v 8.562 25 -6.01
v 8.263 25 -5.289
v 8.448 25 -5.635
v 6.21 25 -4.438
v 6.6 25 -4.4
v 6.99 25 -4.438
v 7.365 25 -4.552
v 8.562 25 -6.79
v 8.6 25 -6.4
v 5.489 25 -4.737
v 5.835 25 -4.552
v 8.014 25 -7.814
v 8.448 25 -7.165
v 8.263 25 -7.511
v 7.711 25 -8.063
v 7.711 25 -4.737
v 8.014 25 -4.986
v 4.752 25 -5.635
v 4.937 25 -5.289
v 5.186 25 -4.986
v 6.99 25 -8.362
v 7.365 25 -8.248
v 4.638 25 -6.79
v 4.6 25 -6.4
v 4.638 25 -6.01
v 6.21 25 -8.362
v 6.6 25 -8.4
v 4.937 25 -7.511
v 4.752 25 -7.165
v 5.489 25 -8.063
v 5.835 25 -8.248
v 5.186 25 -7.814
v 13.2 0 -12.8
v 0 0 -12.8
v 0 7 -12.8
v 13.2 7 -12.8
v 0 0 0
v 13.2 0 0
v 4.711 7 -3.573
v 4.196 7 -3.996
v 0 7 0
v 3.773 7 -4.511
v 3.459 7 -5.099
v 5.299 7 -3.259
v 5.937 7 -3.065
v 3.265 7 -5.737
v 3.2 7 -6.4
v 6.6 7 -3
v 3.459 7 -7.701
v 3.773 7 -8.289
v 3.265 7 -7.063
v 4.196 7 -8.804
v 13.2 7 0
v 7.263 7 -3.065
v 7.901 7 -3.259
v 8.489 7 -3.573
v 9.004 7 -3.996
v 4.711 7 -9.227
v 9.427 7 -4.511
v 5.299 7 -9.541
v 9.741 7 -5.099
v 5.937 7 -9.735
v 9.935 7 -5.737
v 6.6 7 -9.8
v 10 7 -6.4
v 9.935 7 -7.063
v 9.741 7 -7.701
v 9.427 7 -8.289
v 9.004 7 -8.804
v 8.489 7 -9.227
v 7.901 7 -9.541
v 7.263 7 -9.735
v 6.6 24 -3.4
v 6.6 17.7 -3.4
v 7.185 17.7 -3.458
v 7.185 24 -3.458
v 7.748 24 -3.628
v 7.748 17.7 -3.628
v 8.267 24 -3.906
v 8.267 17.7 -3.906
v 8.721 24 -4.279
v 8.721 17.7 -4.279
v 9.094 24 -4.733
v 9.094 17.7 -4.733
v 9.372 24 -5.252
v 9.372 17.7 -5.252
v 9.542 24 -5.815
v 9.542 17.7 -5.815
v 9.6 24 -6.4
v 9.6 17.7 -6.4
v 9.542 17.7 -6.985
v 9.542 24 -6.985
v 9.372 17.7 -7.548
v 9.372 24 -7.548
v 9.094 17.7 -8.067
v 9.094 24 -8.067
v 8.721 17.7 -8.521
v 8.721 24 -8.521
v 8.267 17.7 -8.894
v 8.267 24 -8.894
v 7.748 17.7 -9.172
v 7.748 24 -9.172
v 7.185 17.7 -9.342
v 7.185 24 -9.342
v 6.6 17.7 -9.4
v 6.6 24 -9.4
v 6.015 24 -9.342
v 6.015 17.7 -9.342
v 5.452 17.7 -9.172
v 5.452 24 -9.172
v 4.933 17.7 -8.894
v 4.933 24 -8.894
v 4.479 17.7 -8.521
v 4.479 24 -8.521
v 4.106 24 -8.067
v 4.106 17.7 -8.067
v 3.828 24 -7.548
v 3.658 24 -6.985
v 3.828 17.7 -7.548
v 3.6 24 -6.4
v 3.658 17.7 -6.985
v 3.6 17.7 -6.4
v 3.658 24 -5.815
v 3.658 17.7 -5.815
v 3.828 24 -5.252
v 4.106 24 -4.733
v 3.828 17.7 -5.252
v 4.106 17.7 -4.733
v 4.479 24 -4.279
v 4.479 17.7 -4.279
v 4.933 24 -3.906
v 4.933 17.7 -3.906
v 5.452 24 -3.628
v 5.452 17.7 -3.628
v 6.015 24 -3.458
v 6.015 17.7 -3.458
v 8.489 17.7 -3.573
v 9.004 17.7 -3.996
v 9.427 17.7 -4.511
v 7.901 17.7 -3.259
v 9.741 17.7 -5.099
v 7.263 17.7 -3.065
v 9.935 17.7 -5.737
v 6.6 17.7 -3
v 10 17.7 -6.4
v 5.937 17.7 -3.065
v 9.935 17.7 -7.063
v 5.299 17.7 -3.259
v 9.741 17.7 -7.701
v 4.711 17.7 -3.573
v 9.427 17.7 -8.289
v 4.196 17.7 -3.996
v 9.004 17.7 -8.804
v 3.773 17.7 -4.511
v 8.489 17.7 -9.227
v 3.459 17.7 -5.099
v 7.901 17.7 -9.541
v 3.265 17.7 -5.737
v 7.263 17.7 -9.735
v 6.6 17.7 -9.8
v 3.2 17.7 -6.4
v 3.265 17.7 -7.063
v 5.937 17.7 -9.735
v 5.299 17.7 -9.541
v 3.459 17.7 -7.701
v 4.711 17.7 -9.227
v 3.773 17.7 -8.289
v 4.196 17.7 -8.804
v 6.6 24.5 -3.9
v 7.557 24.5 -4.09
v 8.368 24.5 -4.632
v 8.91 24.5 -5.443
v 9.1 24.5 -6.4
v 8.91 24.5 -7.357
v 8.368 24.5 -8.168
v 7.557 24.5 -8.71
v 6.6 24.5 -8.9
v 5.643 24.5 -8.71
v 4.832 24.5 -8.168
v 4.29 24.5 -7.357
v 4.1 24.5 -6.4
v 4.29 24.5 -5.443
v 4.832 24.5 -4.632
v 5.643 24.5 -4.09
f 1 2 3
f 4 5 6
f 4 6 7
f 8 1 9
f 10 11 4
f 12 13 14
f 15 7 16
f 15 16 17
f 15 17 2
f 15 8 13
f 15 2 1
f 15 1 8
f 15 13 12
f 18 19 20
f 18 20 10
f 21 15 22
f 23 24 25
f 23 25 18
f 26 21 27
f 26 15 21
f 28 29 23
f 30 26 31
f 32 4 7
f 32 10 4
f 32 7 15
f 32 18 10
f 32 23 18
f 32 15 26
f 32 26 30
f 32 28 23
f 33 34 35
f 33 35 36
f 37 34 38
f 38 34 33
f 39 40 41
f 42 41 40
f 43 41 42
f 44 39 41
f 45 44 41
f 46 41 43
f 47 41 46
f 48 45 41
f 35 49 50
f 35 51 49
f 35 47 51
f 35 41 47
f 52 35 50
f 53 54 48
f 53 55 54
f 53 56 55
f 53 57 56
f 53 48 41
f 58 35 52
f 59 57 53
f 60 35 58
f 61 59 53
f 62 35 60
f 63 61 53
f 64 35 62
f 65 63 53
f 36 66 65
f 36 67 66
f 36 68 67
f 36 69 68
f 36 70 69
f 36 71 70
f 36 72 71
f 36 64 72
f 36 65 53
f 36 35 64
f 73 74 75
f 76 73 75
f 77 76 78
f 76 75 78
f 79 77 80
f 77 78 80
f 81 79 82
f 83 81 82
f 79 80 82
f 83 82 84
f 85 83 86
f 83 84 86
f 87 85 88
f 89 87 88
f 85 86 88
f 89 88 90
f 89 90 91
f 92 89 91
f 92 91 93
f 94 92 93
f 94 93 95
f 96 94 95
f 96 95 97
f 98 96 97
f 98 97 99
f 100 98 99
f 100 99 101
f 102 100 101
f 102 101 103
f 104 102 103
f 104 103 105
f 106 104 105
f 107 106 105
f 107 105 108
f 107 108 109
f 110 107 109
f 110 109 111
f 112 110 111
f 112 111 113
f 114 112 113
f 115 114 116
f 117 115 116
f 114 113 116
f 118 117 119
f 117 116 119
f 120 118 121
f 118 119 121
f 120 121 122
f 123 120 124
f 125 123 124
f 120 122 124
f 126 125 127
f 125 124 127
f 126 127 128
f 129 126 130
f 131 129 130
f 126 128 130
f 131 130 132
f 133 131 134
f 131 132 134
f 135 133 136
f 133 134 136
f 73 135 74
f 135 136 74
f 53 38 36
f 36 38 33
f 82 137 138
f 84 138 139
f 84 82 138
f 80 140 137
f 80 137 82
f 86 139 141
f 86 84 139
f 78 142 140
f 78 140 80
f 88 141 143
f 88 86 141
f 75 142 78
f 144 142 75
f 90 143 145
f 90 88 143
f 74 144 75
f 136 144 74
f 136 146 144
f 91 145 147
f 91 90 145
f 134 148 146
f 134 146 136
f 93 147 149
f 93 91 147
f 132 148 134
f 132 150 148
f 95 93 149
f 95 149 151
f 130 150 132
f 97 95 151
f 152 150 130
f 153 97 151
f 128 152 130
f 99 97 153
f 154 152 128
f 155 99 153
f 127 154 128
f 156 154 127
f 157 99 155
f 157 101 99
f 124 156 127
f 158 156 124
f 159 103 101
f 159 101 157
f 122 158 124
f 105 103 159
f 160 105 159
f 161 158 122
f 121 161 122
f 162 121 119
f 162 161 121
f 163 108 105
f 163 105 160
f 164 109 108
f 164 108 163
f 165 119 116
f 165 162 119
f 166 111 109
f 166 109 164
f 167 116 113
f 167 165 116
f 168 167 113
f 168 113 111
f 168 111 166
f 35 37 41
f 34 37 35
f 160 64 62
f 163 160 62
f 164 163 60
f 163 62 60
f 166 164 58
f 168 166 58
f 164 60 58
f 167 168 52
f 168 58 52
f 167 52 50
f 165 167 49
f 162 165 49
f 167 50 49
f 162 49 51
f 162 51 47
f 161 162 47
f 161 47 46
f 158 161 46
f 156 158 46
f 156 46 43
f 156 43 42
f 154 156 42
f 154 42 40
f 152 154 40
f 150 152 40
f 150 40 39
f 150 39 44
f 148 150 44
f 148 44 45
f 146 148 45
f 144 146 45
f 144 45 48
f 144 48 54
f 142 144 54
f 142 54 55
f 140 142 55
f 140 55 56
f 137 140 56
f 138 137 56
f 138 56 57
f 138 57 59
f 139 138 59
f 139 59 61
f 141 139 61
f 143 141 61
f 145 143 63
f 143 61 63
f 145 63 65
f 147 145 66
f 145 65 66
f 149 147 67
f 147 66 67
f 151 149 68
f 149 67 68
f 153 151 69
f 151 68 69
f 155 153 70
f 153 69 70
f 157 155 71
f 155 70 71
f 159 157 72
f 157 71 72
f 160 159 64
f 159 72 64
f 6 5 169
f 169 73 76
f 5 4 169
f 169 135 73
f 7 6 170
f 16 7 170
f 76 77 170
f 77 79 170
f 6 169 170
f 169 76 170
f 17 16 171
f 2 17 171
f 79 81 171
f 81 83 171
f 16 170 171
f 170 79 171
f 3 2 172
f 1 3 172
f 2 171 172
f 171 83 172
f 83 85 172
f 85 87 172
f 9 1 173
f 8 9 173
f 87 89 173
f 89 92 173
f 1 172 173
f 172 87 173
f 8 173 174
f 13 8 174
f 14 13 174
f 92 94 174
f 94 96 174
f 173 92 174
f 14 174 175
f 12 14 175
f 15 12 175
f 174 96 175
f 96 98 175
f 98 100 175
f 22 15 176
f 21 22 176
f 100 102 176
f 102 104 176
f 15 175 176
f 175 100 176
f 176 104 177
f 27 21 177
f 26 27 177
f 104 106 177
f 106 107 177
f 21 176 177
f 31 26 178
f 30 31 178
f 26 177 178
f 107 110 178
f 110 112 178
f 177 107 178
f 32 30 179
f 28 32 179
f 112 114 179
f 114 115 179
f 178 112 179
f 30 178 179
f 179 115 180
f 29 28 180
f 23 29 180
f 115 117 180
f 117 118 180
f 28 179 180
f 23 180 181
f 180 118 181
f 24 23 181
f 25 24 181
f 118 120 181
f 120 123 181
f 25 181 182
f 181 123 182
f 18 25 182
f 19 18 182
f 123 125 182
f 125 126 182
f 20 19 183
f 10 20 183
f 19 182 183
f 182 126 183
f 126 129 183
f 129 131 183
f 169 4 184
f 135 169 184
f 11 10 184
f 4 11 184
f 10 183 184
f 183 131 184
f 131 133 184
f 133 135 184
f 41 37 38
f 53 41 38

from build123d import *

# Parameters (mm, degrees)
SKETCH1_W           = 13.2
SKETCH1_H           = 12.8
BOSS_EXTRUDE1_DEPTH = 7
SKETCH2_R           = 3.4
BOSS_EXTRUDE2_DEPTH = 18
CUT_EXTRUDE1_START  = -7.3
SKETCH3_R           = 3.4
SKETCH3_R_2         = 3
CUT_EXTRUDE1_DEPTH  = 7.3


with BuildPart() as part:
    # Sketch1 → Boss-Extrude1 (new body)
    with BuildSketch(Plane(origin=(0, 0, 0), x_dir=(1, 0, 0), z_dir=(0, 1, 0))):
        with Locations((6.6, 6.4)):
            Rectangle(SKETCH1_W, SKETCH1_H)
    extrude(amount=BOSS_EXTRUDE1_DEPTH)

    # Sketch2 → Boss-Extrude2 (add)
    with BuildSketch(Plane(origin=(0, 7, 0), x_dir=(1, 0, 0), z_dir=(0, 1, 0))):
        with Locations((6.6, 6.4)):
            Circle(SKETCH2_R)
    extrude(amount=BOSS_EXTRUDE2_DEPTH)

    # Sketch3 → Cut-Extrude1 (cut)
    with BuildSketch(Plane(origin=(0, 25, 0), x_dir=(1, 0, 0), z_dir=(0, 1, 0)).offset(CUT_EXTRUDE1_START)):
        with Locations((6.6, 6.4)):
            Circle(SKETCH3_R)
        with Locations((6.6, 6.4)):
            Circle(SKETCH3_R_2, mode=Mode.SUBTRACT)
    extrude(amount=CUT_EXTRUDE1_DEPTH, mode=Mode.SUBTRACT)

    # Sketch7 → Cut-Revolve2 (revolve, cut)
    with BuildSketch(Plane.XY.offset(-6.4)):
        Polygon((8.6, 25), (9.6, 24), (9.6, 25), align=None)
    revolve(axis=Axis((6.6, 25, -6.4), (0, 1, 0)), mode=Mode.SUBTRACT)


solid = part.part
